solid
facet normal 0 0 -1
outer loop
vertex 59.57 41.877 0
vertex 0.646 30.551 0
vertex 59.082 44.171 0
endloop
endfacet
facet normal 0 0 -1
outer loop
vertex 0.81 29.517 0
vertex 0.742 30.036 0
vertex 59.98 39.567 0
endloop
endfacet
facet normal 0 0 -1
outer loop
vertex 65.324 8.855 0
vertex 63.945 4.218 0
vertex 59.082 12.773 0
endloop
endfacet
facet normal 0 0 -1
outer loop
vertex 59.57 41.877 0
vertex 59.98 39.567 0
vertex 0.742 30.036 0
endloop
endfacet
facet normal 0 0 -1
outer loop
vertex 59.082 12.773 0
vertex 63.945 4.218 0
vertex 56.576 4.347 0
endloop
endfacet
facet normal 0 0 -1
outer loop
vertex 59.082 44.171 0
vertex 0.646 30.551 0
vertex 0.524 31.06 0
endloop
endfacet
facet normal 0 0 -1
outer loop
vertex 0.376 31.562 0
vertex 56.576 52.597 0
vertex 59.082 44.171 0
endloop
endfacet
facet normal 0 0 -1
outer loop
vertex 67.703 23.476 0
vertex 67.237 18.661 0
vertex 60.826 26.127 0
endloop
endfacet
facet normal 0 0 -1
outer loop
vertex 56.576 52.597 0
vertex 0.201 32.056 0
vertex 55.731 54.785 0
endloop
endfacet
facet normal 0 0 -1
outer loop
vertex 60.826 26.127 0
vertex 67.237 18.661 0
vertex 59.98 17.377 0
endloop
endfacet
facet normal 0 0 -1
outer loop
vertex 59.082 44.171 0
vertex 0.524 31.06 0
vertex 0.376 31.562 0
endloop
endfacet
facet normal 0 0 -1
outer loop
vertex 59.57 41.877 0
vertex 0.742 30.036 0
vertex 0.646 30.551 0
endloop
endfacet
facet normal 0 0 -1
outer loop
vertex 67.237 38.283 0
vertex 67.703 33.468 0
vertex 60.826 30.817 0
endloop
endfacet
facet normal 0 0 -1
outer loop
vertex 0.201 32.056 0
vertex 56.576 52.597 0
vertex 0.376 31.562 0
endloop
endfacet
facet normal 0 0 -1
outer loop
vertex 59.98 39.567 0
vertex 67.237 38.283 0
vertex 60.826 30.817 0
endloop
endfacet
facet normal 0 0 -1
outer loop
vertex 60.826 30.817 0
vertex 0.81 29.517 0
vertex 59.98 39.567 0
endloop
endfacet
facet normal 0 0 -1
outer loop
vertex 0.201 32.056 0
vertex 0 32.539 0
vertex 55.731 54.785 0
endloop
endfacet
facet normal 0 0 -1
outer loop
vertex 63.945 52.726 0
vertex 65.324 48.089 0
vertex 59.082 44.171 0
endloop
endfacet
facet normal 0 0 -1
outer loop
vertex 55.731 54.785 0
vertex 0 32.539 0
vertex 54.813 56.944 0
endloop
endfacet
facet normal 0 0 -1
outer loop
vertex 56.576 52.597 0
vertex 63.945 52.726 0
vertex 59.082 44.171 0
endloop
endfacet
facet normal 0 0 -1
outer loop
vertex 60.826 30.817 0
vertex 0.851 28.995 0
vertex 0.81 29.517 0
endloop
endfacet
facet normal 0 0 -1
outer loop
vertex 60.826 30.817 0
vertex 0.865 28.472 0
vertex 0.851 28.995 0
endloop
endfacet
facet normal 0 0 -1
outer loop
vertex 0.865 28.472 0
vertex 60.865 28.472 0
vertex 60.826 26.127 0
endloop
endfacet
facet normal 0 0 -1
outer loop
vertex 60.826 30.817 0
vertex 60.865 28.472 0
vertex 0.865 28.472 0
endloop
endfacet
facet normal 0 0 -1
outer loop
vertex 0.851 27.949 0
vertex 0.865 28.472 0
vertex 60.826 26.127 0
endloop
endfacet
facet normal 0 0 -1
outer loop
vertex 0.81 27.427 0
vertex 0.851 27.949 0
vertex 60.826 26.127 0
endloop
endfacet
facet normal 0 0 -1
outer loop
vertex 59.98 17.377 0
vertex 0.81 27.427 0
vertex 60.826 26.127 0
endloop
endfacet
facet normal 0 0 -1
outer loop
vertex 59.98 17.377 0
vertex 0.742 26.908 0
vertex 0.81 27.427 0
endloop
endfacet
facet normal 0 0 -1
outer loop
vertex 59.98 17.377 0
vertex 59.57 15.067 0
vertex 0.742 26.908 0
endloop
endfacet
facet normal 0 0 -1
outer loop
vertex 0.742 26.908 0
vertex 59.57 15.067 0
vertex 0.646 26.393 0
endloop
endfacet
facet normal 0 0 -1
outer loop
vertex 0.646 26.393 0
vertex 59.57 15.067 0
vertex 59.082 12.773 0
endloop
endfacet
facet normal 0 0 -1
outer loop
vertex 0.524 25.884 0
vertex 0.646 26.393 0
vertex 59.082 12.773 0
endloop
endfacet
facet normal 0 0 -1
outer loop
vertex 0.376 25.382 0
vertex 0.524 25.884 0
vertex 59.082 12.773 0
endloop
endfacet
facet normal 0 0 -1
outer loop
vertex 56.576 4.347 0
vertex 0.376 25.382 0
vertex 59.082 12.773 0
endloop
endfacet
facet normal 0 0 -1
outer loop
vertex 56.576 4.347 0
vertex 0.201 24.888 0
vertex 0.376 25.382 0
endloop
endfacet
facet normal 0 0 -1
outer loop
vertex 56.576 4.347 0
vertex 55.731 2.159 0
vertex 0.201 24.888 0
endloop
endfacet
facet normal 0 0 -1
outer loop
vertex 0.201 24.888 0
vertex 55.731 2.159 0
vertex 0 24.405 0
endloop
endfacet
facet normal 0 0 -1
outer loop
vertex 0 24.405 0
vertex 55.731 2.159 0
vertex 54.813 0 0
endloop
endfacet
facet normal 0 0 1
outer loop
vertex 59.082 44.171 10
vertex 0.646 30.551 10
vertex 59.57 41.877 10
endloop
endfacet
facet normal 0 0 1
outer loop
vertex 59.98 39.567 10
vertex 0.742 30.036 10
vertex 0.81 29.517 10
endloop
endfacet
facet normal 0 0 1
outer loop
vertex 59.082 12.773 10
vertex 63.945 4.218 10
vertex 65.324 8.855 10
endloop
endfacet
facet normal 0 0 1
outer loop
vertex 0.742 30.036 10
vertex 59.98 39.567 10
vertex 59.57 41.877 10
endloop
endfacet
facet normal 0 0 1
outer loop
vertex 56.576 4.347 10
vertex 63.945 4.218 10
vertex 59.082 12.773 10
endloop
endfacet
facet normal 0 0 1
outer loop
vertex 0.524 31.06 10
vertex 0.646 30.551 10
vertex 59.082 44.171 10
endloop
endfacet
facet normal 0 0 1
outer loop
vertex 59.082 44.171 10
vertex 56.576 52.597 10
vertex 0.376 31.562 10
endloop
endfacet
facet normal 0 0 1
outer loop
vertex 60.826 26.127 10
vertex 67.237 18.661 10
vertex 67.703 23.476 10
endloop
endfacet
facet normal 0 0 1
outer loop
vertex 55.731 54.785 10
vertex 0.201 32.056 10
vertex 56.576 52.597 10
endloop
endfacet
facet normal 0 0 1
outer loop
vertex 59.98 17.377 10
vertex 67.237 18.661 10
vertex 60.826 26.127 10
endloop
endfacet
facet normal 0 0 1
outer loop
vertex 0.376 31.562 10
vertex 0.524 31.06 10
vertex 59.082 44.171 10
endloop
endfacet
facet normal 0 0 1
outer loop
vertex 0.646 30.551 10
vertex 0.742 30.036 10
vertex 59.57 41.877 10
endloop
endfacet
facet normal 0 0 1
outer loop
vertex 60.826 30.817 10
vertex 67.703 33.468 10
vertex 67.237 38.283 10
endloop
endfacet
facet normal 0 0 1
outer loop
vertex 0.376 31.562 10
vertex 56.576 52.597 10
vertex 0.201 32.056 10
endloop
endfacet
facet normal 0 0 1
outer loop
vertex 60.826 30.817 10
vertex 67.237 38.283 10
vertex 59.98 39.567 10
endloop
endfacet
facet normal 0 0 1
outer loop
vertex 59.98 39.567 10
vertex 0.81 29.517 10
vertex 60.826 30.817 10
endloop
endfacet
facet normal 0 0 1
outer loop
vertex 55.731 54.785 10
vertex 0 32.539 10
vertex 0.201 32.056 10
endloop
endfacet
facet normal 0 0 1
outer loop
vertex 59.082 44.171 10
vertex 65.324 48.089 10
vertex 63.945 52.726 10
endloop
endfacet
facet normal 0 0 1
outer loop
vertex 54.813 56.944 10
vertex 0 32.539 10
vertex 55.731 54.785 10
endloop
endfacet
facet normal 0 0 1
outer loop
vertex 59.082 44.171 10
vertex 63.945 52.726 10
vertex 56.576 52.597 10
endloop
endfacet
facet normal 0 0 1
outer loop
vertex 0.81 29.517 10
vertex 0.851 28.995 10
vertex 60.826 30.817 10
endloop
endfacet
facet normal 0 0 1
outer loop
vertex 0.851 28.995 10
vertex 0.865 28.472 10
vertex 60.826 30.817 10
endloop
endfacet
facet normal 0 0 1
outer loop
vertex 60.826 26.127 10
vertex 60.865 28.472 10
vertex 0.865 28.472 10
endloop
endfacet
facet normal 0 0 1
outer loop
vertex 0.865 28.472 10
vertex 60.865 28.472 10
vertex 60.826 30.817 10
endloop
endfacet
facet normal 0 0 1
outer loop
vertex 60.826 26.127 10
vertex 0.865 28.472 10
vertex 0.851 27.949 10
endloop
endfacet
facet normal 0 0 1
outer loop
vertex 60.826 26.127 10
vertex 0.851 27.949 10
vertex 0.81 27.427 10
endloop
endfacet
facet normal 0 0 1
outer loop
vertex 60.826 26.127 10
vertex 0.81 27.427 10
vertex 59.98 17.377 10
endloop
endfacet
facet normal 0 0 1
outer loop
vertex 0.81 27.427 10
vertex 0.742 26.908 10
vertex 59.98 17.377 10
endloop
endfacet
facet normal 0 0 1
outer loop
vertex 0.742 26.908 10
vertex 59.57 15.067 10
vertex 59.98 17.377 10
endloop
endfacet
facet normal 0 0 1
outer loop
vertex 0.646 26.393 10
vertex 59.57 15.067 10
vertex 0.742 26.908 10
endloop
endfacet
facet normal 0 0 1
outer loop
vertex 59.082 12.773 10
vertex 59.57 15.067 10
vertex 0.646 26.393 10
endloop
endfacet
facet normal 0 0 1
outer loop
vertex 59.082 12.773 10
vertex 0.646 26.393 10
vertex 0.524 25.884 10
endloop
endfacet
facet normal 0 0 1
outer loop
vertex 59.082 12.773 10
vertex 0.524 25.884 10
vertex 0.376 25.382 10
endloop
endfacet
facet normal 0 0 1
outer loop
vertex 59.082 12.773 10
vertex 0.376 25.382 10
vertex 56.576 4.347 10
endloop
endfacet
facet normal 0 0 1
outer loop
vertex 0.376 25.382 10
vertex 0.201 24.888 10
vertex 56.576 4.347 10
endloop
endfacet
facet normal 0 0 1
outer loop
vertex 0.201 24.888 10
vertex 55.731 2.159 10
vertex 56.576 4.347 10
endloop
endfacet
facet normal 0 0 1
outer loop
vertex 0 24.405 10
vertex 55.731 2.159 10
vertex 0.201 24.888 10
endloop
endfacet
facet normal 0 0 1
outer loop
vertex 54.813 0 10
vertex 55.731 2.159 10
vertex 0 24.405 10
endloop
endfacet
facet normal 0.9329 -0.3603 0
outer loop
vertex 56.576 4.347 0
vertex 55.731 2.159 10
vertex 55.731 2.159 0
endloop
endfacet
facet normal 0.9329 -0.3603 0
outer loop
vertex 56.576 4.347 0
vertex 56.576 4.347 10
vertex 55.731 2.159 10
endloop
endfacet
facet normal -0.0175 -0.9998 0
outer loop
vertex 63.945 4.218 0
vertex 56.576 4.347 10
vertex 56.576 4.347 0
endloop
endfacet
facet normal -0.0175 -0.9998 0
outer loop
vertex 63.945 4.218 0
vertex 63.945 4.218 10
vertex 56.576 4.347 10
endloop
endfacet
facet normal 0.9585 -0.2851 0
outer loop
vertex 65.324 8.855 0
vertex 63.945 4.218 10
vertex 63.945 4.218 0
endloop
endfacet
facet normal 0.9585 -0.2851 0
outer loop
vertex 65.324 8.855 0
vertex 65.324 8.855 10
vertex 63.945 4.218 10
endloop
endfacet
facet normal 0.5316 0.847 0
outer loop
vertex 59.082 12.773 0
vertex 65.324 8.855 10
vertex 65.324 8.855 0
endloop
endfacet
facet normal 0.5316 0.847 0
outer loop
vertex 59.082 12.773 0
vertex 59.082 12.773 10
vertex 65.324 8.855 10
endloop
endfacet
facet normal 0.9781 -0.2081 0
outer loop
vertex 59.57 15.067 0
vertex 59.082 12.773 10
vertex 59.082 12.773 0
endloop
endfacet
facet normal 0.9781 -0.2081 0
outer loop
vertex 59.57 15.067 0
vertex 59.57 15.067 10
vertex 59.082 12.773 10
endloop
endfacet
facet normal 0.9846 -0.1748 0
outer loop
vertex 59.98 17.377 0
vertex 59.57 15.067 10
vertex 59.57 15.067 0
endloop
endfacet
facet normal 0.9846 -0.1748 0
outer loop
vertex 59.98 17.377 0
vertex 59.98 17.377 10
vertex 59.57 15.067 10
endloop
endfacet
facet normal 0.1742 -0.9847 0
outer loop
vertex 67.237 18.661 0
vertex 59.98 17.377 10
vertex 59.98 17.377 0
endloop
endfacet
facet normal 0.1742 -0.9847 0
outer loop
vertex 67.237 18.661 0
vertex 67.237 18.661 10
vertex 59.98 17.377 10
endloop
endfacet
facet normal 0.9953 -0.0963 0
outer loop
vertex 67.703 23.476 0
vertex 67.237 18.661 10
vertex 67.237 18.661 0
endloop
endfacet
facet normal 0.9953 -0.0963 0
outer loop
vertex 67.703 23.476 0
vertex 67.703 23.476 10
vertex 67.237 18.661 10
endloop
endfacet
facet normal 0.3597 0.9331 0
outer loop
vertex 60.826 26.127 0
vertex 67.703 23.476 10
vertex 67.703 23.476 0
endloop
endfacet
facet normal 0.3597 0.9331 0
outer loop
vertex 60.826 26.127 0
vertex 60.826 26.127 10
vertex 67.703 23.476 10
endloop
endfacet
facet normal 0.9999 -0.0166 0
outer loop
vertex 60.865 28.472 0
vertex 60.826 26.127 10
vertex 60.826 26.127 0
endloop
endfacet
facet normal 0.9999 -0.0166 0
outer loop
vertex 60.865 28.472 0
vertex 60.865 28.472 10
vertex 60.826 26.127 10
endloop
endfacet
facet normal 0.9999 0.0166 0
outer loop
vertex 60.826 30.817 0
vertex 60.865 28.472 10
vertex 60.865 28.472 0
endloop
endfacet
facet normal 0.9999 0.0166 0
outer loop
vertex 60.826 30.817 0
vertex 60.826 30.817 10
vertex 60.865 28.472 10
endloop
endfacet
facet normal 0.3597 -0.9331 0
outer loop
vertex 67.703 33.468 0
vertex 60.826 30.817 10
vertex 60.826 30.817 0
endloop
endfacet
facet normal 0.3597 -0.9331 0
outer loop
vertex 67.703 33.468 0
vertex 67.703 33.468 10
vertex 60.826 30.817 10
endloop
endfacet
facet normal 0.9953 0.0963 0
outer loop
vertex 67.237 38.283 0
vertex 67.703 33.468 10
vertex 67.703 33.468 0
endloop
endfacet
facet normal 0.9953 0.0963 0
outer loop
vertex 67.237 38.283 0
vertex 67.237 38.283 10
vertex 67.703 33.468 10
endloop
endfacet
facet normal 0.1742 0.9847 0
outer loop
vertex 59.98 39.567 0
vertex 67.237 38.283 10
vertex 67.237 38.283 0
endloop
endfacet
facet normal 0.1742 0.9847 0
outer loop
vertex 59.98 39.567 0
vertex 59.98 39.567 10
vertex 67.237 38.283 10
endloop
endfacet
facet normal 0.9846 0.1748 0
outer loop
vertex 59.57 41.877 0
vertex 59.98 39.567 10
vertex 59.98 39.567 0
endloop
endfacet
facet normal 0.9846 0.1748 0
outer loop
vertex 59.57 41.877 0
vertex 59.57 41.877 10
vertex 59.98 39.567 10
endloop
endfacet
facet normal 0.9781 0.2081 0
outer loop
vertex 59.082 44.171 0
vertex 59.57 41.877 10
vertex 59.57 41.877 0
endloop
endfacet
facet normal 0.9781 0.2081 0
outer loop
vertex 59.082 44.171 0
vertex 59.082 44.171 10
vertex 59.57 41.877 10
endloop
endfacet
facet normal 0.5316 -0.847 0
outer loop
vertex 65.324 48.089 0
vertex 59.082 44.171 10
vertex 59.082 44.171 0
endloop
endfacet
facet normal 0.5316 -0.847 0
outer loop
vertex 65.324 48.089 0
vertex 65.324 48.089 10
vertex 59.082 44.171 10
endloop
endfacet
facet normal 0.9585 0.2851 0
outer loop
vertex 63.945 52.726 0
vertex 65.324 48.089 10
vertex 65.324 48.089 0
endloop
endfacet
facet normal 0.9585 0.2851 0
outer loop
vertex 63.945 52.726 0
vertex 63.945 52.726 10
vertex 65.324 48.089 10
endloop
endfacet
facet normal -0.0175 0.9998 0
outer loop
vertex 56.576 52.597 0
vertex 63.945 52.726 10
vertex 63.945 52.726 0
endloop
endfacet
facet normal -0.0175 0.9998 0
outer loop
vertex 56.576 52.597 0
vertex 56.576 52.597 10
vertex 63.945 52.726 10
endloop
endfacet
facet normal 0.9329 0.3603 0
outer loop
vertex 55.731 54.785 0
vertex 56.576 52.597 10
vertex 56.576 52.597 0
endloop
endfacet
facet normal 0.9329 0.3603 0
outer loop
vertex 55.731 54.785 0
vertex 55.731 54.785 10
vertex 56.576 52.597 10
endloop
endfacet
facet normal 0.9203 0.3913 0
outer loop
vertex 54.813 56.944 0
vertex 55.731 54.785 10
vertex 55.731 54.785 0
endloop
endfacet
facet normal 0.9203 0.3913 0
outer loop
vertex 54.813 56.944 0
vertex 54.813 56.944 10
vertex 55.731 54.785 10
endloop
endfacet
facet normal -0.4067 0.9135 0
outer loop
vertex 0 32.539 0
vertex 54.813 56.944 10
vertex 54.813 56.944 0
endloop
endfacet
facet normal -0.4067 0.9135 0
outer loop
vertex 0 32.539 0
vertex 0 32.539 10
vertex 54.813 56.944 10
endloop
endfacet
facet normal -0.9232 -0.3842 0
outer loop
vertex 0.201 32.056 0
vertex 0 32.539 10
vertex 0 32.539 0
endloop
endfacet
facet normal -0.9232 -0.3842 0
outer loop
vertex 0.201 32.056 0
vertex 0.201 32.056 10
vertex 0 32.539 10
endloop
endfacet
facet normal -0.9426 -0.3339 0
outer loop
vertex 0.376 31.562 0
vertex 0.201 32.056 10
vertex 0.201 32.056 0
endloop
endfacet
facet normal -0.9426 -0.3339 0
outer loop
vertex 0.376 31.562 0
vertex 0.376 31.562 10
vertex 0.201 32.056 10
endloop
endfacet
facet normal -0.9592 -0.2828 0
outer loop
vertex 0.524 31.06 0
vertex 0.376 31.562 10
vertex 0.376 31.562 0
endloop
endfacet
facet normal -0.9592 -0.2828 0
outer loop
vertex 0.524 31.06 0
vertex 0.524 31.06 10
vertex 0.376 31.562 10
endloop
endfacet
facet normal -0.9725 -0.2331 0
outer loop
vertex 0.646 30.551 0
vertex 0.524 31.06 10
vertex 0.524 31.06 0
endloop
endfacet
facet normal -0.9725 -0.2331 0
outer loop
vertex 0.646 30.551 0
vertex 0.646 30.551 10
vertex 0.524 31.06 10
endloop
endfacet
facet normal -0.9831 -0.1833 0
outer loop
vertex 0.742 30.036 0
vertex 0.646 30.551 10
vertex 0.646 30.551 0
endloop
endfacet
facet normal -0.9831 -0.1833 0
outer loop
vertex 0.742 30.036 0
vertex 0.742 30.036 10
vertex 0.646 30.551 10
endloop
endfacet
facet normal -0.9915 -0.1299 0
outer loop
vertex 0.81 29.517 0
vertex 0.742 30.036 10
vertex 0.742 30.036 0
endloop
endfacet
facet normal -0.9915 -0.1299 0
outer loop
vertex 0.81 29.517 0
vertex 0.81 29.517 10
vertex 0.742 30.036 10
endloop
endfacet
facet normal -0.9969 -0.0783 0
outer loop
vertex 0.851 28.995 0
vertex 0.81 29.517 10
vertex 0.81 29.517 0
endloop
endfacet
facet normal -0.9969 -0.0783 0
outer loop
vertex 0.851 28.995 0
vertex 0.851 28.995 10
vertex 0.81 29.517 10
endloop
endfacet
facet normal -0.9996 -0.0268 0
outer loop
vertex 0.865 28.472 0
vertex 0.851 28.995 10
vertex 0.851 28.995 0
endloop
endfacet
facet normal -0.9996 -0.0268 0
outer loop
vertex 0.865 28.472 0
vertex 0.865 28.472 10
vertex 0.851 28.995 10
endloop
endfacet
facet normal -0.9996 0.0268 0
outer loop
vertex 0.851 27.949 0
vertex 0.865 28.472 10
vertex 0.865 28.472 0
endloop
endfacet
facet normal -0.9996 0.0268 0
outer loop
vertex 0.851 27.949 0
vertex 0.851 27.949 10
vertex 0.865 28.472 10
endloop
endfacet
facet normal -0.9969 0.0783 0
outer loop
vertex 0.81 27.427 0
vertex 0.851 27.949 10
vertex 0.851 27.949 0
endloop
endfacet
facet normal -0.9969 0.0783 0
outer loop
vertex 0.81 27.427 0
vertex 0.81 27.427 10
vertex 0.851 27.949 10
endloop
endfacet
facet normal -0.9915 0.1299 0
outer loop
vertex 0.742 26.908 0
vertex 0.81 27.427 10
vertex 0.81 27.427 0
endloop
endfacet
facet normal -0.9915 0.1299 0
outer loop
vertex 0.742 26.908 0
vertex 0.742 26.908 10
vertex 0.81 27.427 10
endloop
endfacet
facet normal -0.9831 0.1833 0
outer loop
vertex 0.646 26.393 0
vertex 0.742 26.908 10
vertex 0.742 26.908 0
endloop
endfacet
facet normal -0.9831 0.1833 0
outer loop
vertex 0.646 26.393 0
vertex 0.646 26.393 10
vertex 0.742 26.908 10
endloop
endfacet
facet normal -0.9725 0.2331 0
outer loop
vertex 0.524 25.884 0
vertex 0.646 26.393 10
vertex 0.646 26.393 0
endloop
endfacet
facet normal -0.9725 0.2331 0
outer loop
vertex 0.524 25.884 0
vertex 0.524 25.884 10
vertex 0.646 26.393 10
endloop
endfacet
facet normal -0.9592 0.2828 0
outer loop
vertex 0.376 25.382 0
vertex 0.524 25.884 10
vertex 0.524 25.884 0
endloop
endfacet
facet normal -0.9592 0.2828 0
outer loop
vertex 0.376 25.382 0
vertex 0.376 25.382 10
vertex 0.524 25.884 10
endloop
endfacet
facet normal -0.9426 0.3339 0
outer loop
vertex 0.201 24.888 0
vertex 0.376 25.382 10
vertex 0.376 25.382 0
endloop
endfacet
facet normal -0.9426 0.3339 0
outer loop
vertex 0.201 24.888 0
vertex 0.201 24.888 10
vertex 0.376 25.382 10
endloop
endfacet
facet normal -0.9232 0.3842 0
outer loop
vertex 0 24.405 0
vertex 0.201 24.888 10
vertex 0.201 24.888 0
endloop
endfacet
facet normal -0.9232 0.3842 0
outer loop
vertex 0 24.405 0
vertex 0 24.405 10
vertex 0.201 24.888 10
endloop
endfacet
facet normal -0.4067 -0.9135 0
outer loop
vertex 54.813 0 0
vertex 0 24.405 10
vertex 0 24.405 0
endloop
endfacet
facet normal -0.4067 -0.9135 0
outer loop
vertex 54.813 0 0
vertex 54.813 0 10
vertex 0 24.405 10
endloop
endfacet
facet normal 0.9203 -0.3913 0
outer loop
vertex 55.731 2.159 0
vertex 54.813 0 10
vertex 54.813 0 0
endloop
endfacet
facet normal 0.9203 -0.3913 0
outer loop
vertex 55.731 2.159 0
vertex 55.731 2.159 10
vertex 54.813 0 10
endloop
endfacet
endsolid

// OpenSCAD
$fn = 32;

// ----------------------------------------------------------------------
// Gear sector: 4 teeth on 48 degrees
// ----------------------------------------------------------------------

// --- parameters (mm) ---
sector_angle = 48;        // sector angle, degrees
root_r = 70;              // root circle radius
tooth_h = 7;              // tooth height over the root circle
teeth = 4;                // number of teeth on the sector
hub_r = 10;               // hub bore radius
plate_t = 10;             // sector thickness, Z
arc_step = 3;             // sampling step of the root/hub arcs, degrees
fit_tol = 0.1;            // declared fit tolerance (prompt contract)
free_tol = 0.5;           // declared free tolerance (prompt contract)

tip_r = root_r + tooth_h;  // tip circle radius

profile = [[54.813, 0], [55.731, 2.159], [56.576, 4.347], [63.945, 4.218], [65.324, 8.855], [59.082, 12.773], [59.57, 15.067], [59.98, 17.377], [67.237, 18.661], [67.703, 23.476], [60.826, 26.127], [60.865, 28.472], [60.826, 30.817], [67.703, 33.468], [67.237, 38.283], [59.98, 39.567], [59.57, 41.877], [59.082, 44.171], [65.324, 48.089], [63.945, 52.726], [56.576, 52.597], [55.731, 54.785], [54.813, 56.944], [0, 32.539], [0.201, 32.056], [0.376, 31.562], [0.524, 31.06], [0.646, 30.551], [0.742, 30.036], [0.81, 29.517], [0.851, 28.995], [0.865, 28.472], [0.851, 27.949], [0.81, 27.427], [0.742, 26.908], [0.646, 26.393], [0.524, 25.884], [0.376, 25.382], [0.201, 24.888], [0, 24.405]];  // primary outline, 40 points, counter clockwise

// --- the one profile operation ---
linear_extrude(height = plate_t) polygon(points = profile);
